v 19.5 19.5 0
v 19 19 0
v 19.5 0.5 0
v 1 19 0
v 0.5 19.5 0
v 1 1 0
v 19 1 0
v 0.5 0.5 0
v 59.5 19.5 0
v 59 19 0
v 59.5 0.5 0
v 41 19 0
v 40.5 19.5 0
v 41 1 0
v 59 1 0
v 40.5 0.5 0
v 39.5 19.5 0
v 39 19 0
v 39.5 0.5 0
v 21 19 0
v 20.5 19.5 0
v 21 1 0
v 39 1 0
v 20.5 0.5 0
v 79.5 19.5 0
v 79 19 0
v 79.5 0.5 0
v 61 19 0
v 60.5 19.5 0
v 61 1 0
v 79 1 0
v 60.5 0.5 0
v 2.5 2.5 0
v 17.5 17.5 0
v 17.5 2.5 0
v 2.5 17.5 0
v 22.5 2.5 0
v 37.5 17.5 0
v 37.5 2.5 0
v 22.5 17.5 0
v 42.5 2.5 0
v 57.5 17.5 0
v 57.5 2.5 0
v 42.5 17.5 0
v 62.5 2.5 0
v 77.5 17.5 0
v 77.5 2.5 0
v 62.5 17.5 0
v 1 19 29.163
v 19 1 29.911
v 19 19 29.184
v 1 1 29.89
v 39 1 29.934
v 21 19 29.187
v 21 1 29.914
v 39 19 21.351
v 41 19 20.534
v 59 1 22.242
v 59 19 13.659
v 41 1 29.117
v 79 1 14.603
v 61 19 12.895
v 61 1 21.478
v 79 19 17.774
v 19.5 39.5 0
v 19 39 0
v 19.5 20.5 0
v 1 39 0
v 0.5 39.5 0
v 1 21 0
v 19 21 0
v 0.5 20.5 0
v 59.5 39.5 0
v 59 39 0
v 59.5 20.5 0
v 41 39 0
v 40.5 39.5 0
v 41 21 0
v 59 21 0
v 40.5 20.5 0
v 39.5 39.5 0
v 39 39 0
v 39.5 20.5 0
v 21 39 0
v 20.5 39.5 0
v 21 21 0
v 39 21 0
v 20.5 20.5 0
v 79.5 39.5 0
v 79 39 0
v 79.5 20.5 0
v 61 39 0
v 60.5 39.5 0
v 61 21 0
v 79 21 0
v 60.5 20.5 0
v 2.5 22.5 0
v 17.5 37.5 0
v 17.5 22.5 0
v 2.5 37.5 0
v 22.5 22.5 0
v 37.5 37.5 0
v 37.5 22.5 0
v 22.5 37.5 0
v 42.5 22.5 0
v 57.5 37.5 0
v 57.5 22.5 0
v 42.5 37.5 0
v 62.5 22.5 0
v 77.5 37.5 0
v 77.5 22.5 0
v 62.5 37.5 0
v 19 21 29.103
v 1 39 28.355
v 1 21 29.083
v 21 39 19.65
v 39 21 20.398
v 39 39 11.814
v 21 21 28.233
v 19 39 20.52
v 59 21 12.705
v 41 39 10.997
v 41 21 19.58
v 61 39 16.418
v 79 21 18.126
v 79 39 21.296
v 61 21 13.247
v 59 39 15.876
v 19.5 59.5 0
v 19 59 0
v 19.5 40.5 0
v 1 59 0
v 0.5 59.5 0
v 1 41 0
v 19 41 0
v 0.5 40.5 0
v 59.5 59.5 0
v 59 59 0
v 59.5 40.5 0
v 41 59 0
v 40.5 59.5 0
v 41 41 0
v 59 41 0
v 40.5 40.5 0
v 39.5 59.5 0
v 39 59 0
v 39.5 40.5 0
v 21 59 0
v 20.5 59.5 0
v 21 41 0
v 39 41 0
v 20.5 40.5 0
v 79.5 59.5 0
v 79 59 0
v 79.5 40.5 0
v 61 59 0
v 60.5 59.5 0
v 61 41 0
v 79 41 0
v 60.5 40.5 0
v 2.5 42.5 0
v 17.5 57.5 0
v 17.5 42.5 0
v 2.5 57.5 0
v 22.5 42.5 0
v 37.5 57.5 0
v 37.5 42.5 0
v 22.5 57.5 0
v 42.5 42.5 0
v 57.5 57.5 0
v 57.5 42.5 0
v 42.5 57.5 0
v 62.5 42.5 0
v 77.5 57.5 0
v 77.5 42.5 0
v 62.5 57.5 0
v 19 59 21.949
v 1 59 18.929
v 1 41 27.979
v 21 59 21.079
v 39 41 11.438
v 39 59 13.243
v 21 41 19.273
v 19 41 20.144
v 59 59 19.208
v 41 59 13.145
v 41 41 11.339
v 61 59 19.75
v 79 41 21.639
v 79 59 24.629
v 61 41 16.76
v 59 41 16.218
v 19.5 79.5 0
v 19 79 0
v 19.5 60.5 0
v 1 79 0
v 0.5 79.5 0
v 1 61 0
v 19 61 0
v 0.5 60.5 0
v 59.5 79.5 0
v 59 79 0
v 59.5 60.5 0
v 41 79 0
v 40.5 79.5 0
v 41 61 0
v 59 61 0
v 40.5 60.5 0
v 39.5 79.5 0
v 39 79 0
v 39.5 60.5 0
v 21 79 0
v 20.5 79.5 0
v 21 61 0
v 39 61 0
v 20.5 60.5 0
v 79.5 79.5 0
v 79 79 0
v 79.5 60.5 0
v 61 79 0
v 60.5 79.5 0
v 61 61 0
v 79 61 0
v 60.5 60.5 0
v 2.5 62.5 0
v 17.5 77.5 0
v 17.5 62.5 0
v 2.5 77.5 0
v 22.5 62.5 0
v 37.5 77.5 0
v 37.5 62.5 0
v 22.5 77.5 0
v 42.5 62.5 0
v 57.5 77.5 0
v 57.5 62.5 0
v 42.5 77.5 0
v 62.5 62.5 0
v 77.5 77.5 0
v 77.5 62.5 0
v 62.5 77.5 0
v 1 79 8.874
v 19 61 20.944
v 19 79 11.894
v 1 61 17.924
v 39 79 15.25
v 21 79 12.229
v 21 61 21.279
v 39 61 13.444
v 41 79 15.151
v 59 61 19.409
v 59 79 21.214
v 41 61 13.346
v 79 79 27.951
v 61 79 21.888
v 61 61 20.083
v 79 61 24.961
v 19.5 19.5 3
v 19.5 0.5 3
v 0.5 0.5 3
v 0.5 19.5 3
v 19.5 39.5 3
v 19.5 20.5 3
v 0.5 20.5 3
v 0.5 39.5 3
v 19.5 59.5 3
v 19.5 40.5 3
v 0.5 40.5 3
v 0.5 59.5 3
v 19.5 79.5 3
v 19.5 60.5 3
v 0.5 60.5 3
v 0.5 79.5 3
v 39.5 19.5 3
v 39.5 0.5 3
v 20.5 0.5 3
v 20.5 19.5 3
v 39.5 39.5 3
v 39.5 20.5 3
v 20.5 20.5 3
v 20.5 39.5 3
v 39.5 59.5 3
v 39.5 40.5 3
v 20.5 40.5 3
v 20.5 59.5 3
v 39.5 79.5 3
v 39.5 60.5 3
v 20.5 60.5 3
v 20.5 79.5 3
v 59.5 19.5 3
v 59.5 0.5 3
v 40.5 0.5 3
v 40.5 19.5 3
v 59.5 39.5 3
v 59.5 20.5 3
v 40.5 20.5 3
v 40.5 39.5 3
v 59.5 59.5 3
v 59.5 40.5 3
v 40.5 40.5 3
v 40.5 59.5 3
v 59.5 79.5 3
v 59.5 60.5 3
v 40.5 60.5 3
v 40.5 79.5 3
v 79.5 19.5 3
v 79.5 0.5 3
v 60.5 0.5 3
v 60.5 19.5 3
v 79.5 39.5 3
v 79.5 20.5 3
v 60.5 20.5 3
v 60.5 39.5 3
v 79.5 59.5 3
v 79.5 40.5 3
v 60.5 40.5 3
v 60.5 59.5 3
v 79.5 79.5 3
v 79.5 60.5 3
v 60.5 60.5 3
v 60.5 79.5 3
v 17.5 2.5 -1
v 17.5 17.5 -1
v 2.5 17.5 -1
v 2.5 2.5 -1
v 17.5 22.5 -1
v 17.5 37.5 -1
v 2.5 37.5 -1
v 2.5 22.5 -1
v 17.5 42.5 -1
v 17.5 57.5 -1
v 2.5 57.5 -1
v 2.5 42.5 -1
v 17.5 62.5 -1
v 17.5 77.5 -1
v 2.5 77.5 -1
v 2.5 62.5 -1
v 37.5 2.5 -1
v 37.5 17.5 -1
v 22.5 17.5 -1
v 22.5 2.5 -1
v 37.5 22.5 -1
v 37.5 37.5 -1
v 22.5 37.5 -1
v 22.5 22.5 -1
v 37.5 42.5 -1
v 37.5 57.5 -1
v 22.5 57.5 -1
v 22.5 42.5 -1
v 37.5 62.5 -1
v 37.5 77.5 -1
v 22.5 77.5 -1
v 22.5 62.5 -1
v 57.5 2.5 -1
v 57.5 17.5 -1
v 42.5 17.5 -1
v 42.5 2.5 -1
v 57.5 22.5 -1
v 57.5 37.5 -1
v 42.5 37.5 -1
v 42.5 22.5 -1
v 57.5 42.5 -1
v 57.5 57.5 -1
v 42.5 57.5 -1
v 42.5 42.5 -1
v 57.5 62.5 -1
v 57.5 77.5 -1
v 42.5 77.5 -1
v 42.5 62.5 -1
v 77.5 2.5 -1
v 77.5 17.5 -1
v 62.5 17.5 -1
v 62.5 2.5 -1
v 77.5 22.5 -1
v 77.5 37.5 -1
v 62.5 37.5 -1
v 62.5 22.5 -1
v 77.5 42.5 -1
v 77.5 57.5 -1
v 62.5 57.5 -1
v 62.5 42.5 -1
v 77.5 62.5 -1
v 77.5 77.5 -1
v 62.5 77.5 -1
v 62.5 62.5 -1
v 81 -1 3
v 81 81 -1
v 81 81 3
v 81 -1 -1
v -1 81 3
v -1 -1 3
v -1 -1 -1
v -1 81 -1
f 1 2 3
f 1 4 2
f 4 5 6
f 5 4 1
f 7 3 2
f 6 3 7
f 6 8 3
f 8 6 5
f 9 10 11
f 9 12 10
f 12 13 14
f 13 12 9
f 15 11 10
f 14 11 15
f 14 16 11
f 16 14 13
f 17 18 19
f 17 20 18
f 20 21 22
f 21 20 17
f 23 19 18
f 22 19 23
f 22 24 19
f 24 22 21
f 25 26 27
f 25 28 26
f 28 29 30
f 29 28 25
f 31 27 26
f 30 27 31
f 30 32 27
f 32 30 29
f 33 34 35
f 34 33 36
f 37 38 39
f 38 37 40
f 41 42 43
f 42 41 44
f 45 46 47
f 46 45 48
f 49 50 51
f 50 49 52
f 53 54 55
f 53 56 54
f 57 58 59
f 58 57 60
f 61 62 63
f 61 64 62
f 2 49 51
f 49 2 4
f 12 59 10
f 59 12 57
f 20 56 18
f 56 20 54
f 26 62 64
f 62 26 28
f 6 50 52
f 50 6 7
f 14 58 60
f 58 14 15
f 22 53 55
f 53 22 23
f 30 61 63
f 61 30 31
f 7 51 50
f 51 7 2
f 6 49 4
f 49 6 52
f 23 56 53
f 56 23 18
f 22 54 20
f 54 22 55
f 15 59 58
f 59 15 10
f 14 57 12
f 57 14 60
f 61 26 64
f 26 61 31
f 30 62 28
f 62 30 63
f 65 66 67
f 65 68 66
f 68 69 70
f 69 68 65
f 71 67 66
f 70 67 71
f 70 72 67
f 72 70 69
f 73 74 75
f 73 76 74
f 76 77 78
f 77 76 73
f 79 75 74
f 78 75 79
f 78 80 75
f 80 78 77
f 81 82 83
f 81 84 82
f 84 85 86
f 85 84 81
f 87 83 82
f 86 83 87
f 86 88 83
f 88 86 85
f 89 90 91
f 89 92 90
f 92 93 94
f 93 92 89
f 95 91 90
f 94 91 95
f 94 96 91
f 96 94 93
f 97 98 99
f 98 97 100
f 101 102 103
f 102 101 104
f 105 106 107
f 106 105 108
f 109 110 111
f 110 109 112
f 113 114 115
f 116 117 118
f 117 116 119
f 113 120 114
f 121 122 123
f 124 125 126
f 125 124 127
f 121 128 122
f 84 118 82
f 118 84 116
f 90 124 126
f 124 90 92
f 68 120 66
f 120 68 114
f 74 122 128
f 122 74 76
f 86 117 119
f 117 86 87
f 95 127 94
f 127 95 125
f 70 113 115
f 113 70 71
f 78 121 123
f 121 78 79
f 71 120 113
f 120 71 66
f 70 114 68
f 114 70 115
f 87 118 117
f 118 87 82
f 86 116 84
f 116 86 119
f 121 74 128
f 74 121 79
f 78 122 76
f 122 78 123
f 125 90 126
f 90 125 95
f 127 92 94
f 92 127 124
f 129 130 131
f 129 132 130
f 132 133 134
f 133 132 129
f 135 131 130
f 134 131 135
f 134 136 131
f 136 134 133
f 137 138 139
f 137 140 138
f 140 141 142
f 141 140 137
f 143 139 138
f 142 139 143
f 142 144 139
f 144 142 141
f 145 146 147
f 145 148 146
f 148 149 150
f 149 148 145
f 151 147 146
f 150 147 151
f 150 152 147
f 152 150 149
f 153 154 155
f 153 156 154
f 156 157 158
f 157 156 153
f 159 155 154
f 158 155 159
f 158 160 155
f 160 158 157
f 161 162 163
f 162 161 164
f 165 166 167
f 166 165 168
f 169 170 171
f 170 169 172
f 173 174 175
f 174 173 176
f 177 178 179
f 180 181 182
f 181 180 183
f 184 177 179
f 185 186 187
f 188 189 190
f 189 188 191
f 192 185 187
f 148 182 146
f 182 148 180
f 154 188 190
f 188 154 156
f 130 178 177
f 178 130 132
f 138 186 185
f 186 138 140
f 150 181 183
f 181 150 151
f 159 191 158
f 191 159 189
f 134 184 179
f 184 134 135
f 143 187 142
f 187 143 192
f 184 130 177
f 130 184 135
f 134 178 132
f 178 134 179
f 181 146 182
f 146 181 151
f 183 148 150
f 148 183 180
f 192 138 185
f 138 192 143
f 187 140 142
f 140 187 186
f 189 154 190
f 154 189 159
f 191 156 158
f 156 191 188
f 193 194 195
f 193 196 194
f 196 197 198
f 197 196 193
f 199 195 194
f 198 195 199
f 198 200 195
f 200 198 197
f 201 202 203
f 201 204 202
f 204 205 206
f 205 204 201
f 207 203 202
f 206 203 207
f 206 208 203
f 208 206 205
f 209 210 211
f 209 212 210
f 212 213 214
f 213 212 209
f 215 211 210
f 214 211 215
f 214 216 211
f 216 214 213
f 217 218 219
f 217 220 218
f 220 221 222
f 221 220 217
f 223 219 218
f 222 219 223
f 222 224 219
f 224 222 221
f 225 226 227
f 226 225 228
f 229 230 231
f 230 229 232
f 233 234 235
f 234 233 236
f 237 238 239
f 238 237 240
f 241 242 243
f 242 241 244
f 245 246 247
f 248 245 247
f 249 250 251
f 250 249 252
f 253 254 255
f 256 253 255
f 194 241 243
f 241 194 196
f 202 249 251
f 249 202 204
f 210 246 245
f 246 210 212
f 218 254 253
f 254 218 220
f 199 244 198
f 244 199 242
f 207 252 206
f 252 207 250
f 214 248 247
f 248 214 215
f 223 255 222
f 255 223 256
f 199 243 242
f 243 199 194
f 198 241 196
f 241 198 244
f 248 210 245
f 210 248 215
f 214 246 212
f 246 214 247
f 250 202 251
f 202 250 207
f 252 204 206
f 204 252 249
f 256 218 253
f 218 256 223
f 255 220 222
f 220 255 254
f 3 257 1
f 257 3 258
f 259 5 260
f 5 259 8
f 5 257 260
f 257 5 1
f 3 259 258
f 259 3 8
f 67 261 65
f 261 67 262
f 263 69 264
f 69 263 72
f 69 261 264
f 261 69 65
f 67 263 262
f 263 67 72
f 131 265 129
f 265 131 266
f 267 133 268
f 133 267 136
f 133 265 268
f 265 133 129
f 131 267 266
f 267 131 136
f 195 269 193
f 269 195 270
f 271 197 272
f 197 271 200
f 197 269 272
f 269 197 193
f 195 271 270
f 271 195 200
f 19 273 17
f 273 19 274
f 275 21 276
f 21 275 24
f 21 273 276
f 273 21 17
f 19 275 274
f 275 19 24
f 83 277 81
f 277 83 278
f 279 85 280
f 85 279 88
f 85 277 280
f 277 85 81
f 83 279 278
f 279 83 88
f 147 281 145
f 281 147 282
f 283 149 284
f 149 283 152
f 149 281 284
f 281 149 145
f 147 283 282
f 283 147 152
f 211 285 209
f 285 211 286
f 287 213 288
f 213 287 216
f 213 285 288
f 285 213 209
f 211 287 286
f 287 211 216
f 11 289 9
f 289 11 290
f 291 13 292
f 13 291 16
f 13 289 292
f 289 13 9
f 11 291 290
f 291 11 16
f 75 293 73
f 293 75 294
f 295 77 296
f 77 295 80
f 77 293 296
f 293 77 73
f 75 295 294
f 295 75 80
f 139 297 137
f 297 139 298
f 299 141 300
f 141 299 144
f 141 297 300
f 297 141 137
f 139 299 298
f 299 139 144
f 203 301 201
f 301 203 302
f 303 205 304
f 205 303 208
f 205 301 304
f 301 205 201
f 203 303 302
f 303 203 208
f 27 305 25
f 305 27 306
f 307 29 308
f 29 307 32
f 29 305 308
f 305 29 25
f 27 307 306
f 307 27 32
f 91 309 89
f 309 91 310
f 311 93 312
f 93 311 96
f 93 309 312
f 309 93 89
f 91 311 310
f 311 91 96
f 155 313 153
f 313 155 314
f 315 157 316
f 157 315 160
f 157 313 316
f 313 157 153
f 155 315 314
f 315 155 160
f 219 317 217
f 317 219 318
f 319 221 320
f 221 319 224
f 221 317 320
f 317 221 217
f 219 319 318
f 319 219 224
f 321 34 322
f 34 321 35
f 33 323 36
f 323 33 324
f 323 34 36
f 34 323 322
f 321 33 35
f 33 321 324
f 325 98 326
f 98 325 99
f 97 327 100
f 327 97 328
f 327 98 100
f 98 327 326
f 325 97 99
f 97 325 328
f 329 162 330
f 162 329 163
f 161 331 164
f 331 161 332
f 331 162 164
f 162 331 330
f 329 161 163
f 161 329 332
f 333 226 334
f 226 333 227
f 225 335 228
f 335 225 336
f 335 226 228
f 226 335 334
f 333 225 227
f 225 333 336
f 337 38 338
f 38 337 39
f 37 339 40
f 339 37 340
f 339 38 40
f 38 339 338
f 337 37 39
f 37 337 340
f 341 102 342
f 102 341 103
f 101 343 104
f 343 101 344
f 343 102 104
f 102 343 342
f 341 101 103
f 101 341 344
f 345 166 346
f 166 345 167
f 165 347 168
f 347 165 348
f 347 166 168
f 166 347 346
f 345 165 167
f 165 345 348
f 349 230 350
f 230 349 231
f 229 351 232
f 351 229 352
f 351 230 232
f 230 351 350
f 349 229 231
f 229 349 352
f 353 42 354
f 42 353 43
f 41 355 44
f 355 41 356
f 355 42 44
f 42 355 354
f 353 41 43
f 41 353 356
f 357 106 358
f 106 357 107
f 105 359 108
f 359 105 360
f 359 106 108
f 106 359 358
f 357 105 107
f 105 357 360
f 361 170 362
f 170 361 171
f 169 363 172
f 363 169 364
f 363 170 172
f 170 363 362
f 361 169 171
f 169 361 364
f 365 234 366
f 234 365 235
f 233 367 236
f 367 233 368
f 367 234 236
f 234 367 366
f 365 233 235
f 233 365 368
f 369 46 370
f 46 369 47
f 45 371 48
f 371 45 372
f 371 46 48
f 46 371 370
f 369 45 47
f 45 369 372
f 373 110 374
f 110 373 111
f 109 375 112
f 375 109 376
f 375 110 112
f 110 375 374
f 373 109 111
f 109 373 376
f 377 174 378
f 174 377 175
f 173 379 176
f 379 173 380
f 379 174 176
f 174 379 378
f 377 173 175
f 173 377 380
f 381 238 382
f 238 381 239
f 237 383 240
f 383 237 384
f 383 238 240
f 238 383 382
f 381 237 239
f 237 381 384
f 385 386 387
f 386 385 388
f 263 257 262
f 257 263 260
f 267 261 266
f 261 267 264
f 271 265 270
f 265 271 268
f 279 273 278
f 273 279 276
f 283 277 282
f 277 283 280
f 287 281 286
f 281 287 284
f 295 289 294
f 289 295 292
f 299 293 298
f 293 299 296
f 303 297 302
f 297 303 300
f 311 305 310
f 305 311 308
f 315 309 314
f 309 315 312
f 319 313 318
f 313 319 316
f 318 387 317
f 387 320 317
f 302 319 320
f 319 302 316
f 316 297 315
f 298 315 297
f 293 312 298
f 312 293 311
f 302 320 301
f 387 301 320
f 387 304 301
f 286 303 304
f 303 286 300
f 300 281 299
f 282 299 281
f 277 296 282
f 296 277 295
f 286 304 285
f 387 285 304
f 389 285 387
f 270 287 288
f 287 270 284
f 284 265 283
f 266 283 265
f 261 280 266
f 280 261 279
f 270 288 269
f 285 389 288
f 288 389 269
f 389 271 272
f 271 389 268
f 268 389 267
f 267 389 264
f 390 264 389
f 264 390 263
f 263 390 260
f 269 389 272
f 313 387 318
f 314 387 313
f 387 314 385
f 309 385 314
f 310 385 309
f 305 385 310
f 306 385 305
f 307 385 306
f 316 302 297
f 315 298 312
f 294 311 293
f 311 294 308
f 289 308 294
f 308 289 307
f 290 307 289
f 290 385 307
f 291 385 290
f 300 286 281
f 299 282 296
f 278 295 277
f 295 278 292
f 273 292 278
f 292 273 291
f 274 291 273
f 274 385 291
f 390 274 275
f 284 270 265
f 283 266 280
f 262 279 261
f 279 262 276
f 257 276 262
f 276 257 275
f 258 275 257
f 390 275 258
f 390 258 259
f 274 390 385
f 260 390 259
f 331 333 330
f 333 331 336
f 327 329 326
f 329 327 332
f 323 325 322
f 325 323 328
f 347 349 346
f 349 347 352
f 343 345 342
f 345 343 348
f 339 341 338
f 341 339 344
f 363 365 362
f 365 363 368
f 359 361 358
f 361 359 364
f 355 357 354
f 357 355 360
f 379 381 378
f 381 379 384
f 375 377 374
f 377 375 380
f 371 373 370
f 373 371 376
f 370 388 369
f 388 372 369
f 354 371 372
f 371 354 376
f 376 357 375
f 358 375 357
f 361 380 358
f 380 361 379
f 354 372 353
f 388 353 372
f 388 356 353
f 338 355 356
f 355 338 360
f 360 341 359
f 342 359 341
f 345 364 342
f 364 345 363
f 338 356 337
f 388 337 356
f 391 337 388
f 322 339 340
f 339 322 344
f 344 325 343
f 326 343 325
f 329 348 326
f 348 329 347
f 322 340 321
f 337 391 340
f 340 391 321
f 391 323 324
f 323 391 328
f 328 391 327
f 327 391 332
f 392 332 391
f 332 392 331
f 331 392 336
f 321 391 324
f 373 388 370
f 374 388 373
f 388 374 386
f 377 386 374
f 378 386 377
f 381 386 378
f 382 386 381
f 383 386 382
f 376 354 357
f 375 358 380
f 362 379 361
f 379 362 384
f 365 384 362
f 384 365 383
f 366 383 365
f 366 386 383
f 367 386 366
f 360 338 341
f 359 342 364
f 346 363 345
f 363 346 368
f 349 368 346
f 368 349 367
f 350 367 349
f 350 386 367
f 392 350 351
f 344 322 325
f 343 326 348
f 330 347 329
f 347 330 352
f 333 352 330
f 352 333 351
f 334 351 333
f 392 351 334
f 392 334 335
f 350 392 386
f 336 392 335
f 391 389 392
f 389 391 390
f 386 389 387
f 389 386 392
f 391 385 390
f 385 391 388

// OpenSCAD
//make sure each stone is quite unique
randomizer_seed=1;
cube_size=20;

// Which one would you like to see?
part = "both"; // [first:Puzzle Only,second:Board Only,both:Puzzle and Board]


/* [Hidden] */
d=1;
ran=rands(cube_size/4,1.5*cube_size,9,randomizer_seed);



module a(){
polyhedron(
  points=[ [0,0,0],[0,4*cube_size,0],[4*cube_size,4*cube_size,0],[4*cube_size,0,0],[0,0,ran[0]],[0,2*cube_size,ran[1]],[0,4*cube_size,ran[2]],[2*cube_size,0,ran[3]],[2*cube_size,2*cube_size,ran[4]],[2*cube_size,4*cube_size,ran[5]],[4*cube_size,0,ran[6]],[4*cube_size,2*cube_size,ran[7]],[4*cube_size,4*cube_size,ran[8]] ],                                 
  faces=[ [2,1,0],[2,0,3],[0,5,4],[1,6,5],[1,5,0],[0,4,7],[7,10,3],[0,7,3],[3,10,11],[11,12,2],[3,11,2],[2,12,9],[9,6,1],[2,9,1],[4,5,7],[5,8,7],[7,8,10],[8,11,10],[5,6,9],[5,9,8],[8,9,12],[8,12,11] ]                        
 );
}


module r(n){
difference(){
a();
translate([-10,cube_size*n+cube_size-d,-1])
cube([6*cube_size,4*cube_size,2*cube_size]);
translate([-cube_size,-4*cube_size+d+cube_size*n,-1])
cube([6*cube_size,4*cube_size,2*cube_size]);
}
}


module p(n,m){
union(){
difference(){
r(n);
translate([cube_size*m+cube_size-d,-cube_size,-1])
cube([4*cube_size,6*cube_size,2*cube_size]);
translate([-4*cube_size+d+cube_size*m,-cube_size,-1])
cube([4*cube_size,6*cube_size,2*cube_size]);
}

}
}

module stones(){
for(i=[0,1,2,3]){
for(j=[0,1,2,3]){
p(i,j);
}
}
}

module board(){
difference(){
translate([-1,-1,-1])
cube([4*cube_size+2,4*cube_size+2,4]);
for(i=[0,1,2,3]){
for(j=[0,1,2,3]){
translate([d/2+cube_size*i,d/2+cube_size*j,0])
cube([cube_size-d,cube_size-d,8]);
}
}
for(i=[0,1,2,3]){
for(j=[0,1,2,3]){
translate([(cube_size/8)+cube_size*i,(cube_size/8)+cube_size*j,-5])
cube([3*cube_size/4,3*cube_size/4,10]);
}
}
}
}

print_part();

module print_part() {
	if (part == "first") {
		stones();
	} else if (part == "second") {
        translate([0,0,1])
		board();
	} else if (part == "both") {
		stones();
        board();

	} else {
		stones();
        board();

	}
}
